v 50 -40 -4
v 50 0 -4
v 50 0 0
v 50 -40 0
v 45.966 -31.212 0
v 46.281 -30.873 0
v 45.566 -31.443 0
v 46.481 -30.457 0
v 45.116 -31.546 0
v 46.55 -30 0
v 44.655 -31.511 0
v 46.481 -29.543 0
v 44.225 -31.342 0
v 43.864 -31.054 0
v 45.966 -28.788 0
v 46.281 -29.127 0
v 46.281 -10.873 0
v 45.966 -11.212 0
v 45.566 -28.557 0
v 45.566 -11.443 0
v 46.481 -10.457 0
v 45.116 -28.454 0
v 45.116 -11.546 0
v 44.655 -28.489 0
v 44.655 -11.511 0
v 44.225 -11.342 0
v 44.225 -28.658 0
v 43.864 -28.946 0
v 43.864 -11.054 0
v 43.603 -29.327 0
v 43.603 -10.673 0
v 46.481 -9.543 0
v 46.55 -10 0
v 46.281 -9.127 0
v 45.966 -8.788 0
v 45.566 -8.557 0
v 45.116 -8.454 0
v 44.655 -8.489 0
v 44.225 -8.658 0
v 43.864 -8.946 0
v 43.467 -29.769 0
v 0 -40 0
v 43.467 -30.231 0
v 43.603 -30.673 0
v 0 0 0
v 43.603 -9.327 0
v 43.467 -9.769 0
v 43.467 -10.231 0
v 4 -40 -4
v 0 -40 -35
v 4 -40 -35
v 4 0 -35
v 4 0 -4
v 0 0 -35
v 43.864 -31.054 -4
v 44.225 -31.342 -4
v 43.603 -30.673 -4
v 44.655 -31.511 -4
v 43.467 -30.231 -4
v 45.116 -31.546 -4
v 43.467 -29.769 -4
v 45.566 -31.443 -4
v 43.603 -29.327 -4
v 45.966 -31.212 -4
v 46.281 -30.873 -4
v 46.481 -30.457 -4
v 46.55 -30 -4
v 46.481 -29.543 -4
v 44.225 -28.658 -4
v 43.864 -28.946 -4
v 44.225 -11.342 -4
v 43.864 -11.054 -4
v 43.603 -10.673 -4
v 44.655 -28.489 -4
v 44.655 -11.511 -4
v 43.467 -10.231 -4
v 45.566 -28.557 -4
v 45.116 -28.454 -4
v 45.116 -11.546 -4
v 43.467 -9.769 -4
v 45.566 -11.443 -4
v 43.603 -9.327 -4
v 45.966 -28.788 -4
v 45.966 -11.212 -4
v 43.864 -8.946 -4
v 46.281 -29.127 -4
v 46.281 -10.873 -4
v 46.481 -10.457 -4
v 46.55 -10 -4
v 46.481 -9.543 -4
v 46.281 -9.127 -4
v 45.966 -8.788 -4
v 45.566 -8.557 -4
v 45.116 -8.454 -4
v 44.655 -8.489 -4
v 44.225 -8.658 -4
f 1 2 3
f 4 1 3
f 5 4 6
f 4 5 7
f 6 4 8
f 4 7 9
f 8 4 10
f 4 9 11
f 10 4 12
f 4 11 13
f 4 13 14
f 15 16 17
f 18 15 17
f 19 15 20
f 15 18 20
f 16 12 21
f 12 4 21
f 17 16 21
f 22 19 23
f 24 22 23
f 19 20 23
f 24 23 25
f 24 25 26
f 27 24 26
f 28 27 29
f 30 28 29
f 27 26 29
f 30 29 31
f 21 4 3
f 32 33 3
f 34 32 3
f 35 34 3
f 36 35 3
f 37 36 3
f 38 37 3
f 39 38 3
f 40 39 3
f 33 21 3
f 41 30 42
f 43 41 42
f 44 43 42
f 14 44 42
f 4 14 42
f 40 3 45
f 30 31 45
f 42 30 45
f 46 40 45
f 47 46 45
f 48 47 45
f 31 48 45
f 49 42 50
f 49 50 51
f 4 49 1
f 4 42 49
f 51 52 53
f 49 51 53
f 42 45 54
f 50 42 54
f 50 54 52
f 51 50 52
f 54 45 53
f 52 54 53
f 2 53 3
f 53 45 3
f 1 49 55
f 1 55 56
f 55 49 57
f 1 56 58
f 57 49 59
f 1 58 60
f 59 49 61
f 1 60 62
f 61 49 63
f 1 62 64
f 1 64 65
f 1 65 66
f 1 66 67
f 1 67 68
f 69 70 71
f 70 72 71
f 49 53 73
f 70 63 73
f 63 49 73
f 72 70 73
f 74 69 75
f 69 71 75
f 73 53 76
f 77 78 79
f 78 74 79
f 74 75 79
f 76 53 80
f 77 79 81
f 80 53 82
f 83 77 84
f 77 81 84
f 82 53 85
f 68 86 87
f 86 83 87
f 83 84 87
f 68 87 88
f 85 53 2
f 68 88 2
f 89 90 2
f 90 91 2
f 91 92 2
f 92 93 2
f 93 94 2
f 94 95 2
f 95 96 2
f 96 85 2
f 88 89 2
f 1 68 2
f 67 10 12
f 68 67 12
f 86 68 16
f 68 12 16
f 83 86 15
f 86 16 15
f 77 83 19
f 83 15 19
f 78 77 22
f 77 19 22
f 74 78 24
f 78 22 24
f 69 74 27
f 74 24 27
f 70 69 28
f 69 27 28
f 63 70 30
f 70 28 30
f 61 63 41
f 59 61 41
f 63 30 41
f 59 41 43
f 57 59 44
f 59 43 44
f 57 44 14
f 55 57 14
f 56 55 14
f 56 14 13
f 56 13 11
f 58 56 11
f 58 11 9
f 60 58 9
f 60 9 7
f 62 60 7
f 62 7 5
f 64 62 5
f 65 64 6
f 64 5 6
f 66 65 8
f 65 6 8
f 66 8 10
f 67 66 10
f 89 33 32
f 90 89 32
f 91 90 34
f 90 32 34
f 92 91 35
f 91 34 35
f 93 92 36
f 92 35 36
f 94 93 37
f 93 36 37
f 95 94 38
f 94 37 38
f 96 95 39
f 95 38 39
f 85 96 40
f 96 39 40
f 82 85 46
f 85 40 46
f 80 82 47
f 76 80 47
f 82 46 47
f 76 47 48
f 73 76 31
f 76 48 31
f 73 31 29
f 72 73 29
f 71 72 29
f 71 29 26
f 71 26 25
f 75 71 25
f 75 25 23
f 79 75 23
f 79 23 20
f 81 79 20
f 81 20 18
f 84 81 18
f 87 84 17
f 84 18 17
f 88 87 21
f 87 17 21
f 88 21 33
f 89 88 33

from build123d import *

# Parameters (mm, degrees)
F1_DEPTH = 40
F2_R     = 1.55
F3_DEPTH = 4


with BuildPart() as f1:
    # F0 (on Front) → F1 (new body)
    with BuildSketch(Plane.XZ):
        Polygon((50, 0), (0, 0), (0, -35), (4, -35), (4, -4), (50, -4), align=None)
    extrude(amount=F1_DEPTH)

    # F2 (on face) → F3 (cut, through all)
    with BuildSketch(Plane.XY):
        with Locations((45, -10)):
            Circle(F2_R)
        with Locations((45, -30)):
            Circle(F2_R)
    extrude(amount=-F3_DEPTH, mode=Mode.SUBTRACT)


solid = f1.part
